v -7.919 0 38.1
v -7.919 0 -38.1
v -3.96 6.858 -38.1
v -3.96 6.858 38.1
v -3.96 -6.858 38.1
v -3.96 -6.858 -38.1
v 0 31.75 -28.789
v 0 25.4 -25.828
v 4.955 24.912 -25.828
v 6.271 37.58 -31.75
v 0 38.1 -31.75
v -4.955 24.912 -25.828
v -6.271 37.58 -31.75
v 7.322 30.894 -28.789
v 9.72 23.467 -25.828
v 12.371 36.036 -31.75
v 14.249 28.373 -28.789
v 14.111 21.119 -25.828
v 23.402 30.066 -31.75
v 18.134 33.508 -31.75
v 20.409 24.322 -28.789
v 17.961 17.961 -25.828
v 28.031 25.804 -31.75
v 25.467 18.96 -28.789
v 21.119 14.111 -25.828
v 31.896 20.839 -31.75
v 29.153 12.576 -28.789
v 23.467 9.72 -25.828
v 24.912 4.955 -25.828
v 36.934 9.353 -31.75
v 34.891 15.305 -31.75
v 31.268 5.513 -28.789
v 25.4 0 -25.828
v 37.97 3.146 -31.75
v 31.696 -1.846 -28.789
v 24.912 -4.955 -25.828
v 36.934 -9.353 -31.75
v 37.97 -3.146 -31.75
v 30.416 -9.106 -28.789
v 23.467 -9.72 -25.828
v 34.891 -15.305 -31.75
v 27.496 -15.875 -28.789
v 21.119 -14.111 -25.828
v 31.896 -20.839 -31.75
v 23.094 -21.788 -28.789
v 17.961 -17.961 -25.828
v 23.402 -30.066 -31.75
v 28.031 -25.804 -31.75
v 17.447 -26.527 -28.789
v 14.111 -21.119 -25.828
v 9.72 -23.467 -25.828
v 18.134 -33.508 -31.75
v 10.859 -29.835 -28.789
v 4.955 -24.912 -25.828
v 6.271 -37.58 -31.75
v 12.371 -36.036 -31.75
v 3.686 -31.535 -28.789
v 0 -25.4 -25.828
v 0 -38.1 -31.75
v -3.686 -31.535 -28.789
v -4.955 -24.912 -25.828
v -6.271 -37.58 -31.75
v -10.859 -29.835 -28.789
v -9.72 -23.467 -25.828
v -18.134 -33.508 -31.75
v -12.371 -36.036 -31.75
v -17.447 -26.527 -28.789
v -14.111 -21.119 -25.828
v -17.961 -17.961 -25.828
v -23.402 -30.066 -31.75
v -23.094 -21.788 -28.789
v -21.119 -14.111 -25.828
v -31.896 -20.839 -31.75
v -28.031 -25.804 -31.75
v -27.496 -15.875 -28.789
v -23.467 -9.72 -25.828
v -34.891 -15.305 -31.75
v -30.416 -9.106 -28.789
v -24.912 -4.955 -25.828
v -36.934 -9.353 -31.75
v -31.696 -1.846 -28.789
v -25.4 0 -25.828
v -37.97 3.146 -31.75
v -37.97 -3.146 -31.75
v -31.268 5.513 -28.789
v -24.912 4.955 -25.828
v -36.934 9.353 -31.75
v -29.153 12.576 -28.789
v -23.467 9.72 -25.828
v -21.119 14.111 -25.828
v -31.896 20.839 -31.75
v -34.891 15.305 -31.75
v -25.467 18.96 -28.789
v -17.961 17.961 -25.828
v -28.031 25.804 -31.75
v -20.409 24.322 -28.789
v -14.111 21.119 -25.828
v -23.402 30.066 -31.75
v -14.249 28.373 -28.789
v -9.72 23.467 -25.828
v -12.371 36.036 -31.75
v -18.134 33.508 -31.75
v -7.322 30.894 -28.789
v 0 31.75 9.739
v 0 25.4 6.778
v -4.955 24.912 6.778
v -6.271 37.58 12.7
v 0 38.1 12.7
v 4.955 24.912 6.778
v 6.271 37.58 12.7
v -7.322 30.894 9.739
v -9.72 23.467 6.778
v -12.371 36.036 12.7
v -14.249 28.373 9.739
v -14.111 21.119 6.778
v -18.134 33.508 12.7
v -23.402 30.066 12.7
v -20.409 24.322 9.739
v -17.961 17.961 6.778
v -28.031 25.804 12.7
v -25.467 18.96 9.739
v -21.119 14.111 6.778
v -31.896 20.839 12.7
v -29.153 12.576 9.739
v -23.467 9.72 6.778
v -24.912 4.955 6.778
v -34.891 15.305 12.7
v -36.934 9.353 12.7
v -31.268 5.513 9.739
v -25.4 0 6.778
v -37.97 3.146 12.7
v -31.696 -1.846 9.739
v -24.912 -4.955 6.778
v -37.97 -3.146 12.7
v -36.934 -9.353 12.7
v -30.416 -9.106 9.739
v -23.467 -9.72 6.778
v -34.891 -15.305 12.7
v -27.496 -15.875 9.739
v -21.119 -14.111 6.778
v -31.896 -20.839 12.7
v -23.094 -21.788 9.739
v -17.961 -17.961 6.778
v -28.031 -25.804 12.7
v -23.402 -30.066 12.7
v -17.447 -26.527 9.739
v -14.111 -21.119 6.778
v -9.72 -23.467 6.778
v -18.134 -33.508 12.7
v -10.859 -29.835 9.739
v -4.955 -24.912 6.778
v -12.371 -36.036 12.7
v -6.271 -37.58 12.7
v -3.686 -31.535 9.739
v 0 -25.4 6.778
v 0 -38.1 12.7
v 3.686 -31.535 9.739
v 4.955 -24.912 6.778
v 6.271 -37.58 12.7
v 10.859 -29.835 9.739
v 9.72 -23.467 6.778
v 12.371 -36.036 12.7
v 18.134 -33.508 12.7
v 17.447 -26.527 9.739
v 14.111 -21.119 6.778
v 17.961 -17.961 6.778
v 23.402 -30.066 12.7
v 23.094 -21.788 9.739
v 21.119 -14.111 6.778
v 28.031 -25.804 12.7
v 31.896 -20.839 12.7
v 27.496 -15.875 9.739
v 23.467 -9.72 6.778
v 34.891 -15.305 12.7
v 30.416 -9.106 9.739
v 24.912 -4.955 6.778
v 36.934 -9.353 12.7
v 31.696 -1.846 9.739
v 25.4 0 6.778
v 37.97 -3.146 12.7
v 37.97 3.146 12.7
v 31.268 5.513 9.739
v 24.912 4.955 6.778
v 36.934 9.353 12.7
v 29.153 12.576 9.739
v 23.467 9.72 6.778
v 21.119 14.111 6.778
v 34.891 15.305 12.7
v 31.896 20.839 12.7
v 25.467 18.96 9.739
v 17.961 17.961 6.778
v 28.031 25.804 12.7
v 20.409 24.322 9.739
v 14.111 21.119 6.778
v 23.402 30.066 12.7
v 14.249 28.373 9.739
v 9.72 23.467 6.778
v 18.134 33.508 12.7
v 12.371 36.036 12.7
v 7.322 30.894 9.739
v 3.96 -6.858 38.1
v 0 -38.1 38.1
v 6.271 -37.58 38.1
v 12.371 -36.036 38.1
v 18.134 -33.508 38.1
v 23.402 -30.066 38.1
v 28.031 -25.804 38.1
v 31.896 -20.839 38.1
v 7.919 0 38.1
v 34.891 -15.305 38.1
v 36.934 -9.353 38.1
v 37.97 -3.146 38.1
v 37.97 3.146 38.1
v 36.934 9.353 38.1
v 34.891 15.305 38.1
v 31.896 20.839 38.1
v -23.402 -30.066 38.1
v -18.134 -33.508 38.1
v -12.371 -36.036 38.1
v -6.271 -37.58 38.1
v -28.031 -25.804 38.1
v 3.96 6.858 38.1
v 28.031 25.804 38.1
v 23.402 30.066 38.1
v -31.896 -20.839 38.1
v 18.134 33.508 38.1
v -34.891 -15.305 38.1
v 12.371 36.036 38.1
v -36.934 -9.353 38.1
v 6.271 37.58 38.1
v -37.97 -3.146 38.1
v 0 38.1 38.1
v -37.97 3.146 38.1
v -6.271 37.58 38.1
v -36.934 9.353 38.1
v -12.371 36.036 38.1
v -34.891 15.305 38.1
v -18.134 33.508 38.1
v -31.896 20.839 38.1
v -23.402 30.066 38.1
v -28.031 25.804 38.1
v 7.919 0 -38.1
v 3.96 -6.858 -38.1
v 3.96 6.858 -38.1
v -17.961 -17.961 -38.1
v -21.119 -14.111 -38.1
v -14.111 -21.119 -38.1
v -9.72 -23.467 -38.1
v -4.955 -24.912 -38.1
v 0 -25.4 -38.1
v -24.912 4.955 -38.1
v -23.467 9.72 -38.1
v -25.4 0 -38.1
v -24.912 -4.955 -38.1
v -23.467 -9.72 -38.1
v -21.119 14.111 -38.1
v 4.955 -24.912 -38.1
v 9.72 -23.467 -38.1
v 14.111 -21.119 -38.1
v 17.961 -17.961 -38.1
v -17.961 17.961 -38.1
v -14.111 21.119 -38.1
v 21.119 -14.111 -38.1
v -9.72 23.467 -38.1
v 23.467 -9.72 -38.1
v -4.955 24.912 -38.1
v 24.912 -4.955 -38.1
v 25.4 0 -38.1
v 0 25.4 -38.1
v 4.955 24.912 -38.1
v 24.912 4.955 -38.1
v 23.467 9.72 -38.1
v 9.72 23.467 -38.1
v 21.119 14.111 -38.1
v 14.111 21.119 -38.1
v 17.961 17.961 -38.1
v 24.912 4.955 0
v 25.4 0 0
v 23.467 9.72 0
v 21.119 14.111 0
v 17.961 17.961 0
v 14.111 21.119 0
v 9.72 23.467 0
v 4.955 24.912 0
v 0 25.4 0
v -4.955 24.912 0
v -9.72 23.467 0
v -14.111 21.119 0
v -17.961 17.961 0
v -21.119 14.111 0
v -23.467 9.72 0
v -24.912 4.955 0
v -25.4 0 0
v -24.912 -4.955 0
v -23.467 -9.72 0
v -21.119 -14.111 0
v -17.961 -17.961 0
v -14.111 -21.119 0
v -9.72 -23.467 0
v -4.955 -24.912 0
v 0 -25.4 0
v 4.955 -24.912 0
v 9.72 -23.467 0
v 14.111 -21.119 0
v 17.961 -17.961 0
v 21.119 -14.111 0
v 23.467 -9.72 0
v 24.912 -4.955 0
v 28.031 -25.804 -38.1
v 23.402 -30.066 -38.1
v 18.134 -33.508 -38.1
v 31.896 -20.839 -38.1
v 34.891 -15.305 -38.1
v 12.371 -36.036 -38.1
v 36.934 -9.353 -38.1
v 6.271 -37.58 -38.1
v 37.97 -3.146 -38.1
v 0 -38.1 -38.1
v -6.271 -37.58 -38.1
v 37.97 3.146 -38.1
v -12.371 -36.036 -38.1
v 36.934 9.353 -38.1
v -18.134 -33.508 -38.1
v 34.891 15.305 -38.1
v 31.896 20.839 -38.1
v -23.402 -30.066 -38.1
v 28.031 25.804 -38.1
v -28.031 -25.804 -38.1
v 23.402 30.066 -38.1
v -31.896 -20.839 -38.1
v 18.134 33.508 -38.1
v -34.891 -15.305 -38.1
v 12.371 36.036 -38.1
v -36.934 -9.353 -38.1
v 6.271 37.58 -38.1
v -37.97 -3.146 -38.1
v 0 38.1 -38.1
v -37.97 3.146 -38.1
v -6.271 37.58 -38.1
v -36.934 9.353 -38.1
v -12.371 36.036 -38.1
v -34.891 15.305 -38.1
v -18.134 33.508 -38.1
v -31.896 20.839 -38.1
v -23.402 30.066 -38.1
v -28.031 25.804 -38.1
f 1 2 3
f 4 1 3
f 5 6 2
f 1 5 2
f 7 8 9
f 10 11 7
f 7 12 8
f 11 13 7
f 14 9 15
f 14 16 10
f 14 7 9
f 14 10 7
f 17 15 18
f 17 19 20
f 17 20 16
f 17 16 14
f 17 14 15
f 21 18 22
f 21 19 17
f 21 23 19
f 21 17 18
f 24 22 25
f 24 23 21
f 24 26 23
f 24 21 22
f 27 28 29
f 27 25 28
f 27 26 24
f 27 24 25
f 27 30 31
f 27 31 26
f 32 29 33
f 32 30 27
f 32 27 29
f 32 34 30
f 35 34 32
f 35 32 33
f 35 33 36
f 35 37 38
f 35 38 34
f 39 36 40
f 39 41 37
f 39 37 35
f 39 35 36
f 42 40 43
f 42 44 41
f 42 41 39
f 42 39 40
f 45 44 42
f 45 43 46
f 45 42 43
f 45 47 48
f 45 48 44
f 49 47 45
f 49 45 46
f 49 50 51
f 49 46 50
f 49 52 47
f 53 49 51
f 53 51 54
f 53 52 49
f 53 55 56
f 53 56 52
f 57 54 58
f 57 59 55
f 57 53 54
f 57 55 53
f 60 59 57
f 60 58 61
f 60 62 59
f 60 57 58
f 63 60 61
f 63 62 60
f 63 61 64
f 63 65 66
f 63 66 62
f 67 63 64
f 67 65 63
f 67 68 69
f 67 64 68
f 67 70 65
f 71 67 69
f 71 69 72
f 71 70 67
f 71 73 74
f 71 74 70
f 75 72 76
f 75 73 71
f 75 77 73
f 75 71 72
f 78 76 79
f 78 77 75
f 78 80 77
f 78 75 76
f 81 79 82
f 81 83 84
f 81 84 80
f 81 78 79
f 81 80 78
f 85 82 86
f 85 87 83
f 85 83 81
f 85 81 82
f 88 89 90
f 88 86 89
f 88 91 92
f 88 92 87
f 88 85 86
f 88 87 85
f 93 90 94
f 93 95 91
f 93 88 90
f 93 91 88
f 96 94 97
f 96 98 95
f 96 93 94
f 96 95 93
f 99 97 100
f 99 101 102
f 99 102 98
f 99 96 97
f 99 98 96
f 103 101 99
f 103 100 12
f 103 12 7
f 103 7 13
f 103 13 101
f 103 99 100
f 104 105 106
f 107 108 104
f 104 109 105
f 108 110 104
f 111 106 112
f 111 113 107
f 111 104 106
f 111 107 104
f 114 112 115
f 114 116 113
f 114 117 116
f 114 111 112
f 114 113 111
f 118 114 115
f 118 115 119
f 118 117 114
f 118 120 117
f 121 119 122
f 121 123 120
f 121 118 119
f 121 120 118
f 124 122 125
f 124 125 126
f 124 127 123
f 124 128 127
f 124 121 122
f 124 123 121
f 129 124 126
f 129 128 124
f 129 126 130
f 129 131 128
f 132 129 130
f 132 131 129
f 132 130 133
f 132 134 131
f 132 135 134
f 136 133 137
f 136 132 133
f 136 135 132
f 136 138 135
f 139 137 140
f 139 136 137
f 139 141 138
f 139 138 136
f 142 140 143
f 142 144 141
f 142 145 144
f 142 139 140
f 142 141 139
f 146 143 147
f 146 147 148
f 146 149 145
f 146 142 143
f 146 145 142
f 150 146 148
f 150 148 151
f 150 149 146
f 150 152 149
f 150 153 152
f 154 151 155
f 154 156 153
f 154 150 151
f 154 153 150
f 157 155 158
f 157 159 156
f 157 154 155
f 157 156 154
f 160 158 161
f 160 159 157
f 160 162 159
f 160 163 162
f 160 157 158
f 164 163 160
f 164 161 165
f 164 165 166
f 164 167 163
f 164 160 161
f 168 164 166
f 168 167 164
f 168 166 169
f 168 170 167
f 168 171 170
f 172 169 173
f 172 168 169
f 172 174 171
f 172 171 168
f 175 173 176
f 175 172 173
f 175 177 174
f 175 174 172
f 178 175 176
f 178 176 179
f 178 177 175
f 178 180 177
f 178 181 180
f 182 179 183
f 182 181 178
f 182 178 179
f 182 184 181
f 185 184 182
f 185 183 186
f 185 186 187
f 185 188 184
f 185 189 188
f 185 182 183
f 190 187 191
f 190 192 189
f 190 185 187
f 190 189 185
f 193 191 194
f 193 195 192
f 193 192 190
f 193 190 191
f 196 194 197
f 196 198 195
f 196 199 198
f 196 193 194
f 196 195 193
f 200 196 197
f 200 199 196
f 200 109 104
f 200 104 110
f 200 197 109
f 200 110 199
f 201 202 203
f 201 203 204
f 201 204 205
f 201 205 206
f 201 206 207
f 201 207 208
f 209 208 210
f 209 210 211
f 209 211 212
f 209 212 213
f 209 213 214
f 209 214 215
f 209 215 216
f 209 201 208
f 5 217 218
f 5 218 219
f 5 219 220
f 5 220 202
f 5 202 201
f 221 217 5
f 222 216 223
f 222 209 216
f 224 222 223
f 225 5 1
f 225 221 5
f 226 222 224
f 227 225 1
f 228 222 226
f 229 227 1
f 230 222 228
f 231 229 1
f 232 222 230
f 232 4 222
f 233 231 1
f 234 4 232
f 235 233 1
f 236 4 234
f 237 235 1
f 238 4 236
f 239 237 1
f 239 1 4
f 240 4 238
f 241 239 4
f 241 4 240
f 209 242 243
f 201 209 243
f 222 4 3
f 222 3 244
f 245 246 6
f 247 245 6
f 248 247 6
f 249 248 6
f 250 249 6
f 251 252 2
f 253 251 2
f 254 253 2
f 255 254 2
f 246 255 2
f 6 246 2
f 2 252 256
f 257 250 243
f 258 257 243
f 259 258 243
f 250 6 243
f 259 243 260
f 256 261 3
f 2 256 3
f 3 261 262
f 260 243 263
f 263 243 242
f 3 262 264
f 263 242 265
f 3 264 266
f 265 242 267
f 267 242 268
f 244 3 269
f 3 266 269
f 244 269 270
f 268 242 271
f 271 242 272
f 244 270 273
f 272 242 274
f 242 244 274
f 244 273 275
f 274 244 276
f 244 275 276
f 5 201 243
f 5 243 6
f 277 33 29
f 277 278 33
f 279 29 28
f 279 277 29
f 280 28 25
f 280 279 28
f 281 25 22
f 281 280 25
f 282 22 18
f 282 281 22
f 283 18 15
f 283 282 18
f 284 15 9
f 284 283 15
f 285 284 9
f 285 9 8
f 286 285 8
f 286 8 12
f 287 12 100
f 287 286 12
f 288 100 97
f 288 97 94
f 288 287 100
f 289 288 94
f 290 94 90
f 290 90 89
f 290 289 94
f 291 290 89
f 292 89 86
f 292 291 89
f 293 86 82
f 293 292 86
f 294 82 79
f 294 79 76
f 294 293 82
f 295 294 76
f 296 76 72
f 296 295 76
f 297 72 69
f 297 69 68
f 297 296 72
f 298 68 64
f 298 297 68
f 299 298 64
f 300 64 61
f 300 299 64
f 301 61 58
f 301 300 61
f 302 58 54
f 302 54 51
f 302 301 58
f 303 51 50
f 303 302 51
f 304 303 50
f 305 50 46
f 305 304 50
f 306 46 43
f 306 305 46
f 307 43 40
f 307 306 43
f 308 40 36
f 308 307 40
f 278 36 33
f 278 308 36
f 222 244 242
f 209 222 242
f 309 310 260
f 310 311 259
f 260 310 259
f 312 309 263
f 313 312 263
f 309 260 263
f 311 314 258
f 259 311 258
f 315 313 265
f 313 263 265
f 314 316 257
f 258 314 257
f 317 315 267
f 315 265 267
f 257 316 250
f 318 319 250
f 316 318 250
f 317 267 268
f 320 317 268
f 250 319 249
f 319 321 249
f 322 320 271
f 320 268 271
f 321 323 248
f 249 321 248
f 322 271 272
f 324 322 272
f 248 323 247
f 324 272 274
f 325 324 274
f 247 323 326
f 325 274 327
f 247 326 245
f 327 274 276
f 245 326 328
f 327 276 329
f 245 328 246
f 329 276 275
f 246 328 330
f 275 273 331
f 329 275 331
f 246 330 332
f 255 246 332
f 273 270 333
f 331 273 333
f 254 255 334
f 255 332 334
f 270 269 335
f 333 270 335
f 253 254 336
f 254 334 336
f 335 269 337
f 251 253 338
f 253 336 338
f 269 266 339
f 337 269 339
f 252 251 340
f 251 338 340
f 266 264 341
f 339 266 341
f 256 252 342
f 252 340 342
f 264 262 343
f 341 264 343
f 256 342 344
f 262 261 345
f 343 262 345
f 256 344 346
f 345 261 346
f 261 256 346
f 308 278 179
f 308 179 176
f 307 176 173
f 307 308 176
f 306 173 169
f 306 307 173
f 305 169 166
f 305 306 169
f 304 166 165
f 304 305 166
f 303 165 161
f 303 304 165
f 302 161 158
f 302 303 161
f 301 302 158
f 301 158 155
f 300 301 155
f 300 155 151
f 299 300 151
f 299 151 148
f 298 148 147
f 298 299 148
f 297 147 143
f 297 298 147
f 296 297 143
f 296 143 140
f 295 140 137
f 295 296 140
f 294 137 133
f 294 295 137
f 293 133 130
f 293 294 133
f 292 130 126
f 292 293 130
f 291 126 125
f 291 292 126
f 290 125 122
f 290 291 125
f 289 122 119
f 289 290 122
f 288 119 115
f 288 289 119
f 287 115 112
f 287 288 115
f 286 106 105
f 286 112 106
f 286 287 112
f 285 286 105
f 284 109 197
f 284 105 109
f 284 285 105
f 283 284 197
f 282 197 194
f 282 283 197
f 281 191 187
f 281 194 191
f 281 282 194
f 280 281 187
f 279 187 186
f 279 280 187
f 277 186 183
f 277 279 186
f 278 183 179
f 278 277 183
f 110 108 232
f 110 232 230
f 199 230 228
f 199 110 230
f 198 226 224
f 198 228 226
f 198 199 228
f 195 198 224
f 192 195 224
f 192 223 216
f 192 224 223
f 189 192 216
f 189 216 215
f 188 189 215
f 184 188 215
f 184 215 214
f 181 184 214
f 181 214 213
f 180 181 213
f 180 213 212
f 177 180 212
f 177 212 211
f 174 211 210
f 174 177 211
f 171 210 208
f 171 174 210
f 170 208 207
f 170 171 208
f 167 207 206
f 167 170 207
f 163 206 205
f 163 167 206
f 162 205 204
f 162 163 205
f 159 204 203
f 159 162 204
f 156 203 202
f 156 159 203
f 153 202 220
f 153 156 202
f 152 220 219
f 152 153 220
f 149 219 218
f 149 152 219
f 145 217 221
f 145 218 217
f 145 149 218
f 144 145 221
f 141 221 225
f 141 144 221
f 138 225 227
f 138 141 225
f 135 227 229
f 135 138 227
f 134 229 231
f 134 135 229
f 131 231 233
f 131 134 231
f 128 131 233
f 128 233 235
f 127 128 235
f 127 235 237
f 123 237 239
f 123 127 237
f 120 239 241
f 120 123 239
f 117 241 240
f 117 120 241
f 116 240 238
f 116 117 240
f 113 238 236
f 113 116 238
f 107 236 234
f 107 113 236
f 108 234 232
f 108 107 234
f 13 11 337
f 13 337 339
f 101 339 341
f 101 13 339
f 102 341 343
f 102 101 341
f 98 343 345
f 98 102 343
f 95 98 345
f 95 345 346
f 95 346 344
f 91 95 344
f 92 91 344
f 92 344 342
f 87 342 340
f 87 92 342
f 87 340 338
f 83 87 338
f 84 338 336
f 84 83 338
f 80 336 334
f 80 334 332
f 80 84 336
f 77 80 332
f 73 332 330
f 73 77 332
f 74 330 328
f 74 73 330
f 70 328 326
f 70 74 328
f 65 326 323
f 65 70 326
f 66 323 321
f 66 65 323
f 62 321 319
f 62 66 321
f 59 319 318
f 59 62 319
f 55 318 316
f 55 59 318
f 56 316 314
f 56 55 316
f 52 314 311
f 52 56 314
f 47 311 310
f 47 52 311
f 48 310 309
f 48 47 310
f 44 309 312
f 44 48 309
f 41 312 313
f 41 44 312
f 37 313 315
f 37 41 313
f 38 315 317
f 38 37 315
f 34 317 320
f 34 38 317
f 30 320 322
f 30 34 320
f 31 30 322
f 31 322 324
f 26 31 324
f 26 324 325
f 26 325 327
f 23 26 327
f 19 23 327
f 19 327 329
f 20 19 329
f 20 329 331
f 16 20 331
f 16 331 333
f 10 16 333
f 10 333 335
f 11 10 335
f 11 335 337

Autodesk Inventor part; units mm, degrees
ref_plane "YZ Plane" through (0, 0, 0) normal (1, 0, 0) x (0, 1, 0)
ref_plane "XZ Plane" through (0, 0, 0) normal (0, 1, 0) x (-1, 0, 0)
ref_plane "XY Plane" through (0, 0, 0) normal (0, 0, 1) x (1, 0, 0)
sketch "Sketch1" plane through (0, 0, 0) normal (0, 0, 1) x (1, 0, 0)
  circle A0 centre (0, 0) radius 25.4
  line L0 (7.9189, 0) -> (3.9595, -6.858)
  line L1 (3.9595, -6.858) -> (-3.9595, -6.858)
  line L2 (-3.9595, -6.858) -> (-7.9189, 0)
  line L3 (-7.9189, 0) -> (-3.9595, 6.858)
  line L4 (-3.9595, 6.858) -> (3.9595, 6.858)
  line L5 (3.9595, 6.858) -> (7.9189, 0)
  dimension "d0" = 50.8
  dimension "d1" = 13.716
extrude "Extrusion1" add sketch "Sketch1" along normal mid plane 76.2
sketch "Sketch3" plane through (0, 0, 0) normal (1, 0, 0) x (0, 1, 0)
  line L0 (25.4, 38.1) -> (-25.4, 38.1) projected
  line L1 (25.4, 38.1) -> (38.1, 38.1)
  line L2 (25.4, -38.1) -> (25.4, 38.1) projected
  line L3 (0, -53.34) -> (0, 53.34) projected
  line L4 (38.1, 38.1) -> (38.1, 12.7)
  line L5 (38.1, 12.7) -> (24.2886, 6.2597)
  line L6 (24.2886, 6.2597) -> (25.4, 6.7779)
  line L7 (25.4, -38.1) -> (25.4, 38.1) projected
  point P0 (0, 0)
  point P1 (25.4, 19.4779)
  point P2 (25.4, 6.7779)
  dimension "d9" = 12.7
  dimension "d12" = 25.4
  dimension "d13" = 115
revolve "Revolution1" add sketch "Sketch3" angle 360 about axis through (0, 0, -10) along (0, 0, 1)
sketch "Sketch4" plane through (0, 0, 0) normal (1, 0, 0) x (0, 1, 0)
  line L0 (25.4, -38.1) -> (25.4, 6.7779) projected
  line L1 (-25.4, -38.1) -> (25.4, -38.1) projected
  line L2 (25.4, -38.1) -> (38.1, -38.1)
  line L3 (38.1, -38.1) -> (38.1, -31.75)
  line L4 (38.1, -31.75) -> (24.8707, -25.5811)
  line L5 (0, -46.9275) -> (0, 14.8652) projected
  line L6 (24.8707, -25.5811) -> (25.4, -25.8279)
  line L7 (25.4, -38.1) -> (25.4, 6.7779) projected
  point P0 (0, 0)
  point P1 (25.4, -25.8279)
  dimension "d14" = 12.7
  dimension "d15" = 6.35
  dimension "d16" = 115
revolve "Revolution2" add sketch "Sketch4" angle 360 about axis through (0, 0, -10) along (0, 0, 1)
properties part number "pulley"
